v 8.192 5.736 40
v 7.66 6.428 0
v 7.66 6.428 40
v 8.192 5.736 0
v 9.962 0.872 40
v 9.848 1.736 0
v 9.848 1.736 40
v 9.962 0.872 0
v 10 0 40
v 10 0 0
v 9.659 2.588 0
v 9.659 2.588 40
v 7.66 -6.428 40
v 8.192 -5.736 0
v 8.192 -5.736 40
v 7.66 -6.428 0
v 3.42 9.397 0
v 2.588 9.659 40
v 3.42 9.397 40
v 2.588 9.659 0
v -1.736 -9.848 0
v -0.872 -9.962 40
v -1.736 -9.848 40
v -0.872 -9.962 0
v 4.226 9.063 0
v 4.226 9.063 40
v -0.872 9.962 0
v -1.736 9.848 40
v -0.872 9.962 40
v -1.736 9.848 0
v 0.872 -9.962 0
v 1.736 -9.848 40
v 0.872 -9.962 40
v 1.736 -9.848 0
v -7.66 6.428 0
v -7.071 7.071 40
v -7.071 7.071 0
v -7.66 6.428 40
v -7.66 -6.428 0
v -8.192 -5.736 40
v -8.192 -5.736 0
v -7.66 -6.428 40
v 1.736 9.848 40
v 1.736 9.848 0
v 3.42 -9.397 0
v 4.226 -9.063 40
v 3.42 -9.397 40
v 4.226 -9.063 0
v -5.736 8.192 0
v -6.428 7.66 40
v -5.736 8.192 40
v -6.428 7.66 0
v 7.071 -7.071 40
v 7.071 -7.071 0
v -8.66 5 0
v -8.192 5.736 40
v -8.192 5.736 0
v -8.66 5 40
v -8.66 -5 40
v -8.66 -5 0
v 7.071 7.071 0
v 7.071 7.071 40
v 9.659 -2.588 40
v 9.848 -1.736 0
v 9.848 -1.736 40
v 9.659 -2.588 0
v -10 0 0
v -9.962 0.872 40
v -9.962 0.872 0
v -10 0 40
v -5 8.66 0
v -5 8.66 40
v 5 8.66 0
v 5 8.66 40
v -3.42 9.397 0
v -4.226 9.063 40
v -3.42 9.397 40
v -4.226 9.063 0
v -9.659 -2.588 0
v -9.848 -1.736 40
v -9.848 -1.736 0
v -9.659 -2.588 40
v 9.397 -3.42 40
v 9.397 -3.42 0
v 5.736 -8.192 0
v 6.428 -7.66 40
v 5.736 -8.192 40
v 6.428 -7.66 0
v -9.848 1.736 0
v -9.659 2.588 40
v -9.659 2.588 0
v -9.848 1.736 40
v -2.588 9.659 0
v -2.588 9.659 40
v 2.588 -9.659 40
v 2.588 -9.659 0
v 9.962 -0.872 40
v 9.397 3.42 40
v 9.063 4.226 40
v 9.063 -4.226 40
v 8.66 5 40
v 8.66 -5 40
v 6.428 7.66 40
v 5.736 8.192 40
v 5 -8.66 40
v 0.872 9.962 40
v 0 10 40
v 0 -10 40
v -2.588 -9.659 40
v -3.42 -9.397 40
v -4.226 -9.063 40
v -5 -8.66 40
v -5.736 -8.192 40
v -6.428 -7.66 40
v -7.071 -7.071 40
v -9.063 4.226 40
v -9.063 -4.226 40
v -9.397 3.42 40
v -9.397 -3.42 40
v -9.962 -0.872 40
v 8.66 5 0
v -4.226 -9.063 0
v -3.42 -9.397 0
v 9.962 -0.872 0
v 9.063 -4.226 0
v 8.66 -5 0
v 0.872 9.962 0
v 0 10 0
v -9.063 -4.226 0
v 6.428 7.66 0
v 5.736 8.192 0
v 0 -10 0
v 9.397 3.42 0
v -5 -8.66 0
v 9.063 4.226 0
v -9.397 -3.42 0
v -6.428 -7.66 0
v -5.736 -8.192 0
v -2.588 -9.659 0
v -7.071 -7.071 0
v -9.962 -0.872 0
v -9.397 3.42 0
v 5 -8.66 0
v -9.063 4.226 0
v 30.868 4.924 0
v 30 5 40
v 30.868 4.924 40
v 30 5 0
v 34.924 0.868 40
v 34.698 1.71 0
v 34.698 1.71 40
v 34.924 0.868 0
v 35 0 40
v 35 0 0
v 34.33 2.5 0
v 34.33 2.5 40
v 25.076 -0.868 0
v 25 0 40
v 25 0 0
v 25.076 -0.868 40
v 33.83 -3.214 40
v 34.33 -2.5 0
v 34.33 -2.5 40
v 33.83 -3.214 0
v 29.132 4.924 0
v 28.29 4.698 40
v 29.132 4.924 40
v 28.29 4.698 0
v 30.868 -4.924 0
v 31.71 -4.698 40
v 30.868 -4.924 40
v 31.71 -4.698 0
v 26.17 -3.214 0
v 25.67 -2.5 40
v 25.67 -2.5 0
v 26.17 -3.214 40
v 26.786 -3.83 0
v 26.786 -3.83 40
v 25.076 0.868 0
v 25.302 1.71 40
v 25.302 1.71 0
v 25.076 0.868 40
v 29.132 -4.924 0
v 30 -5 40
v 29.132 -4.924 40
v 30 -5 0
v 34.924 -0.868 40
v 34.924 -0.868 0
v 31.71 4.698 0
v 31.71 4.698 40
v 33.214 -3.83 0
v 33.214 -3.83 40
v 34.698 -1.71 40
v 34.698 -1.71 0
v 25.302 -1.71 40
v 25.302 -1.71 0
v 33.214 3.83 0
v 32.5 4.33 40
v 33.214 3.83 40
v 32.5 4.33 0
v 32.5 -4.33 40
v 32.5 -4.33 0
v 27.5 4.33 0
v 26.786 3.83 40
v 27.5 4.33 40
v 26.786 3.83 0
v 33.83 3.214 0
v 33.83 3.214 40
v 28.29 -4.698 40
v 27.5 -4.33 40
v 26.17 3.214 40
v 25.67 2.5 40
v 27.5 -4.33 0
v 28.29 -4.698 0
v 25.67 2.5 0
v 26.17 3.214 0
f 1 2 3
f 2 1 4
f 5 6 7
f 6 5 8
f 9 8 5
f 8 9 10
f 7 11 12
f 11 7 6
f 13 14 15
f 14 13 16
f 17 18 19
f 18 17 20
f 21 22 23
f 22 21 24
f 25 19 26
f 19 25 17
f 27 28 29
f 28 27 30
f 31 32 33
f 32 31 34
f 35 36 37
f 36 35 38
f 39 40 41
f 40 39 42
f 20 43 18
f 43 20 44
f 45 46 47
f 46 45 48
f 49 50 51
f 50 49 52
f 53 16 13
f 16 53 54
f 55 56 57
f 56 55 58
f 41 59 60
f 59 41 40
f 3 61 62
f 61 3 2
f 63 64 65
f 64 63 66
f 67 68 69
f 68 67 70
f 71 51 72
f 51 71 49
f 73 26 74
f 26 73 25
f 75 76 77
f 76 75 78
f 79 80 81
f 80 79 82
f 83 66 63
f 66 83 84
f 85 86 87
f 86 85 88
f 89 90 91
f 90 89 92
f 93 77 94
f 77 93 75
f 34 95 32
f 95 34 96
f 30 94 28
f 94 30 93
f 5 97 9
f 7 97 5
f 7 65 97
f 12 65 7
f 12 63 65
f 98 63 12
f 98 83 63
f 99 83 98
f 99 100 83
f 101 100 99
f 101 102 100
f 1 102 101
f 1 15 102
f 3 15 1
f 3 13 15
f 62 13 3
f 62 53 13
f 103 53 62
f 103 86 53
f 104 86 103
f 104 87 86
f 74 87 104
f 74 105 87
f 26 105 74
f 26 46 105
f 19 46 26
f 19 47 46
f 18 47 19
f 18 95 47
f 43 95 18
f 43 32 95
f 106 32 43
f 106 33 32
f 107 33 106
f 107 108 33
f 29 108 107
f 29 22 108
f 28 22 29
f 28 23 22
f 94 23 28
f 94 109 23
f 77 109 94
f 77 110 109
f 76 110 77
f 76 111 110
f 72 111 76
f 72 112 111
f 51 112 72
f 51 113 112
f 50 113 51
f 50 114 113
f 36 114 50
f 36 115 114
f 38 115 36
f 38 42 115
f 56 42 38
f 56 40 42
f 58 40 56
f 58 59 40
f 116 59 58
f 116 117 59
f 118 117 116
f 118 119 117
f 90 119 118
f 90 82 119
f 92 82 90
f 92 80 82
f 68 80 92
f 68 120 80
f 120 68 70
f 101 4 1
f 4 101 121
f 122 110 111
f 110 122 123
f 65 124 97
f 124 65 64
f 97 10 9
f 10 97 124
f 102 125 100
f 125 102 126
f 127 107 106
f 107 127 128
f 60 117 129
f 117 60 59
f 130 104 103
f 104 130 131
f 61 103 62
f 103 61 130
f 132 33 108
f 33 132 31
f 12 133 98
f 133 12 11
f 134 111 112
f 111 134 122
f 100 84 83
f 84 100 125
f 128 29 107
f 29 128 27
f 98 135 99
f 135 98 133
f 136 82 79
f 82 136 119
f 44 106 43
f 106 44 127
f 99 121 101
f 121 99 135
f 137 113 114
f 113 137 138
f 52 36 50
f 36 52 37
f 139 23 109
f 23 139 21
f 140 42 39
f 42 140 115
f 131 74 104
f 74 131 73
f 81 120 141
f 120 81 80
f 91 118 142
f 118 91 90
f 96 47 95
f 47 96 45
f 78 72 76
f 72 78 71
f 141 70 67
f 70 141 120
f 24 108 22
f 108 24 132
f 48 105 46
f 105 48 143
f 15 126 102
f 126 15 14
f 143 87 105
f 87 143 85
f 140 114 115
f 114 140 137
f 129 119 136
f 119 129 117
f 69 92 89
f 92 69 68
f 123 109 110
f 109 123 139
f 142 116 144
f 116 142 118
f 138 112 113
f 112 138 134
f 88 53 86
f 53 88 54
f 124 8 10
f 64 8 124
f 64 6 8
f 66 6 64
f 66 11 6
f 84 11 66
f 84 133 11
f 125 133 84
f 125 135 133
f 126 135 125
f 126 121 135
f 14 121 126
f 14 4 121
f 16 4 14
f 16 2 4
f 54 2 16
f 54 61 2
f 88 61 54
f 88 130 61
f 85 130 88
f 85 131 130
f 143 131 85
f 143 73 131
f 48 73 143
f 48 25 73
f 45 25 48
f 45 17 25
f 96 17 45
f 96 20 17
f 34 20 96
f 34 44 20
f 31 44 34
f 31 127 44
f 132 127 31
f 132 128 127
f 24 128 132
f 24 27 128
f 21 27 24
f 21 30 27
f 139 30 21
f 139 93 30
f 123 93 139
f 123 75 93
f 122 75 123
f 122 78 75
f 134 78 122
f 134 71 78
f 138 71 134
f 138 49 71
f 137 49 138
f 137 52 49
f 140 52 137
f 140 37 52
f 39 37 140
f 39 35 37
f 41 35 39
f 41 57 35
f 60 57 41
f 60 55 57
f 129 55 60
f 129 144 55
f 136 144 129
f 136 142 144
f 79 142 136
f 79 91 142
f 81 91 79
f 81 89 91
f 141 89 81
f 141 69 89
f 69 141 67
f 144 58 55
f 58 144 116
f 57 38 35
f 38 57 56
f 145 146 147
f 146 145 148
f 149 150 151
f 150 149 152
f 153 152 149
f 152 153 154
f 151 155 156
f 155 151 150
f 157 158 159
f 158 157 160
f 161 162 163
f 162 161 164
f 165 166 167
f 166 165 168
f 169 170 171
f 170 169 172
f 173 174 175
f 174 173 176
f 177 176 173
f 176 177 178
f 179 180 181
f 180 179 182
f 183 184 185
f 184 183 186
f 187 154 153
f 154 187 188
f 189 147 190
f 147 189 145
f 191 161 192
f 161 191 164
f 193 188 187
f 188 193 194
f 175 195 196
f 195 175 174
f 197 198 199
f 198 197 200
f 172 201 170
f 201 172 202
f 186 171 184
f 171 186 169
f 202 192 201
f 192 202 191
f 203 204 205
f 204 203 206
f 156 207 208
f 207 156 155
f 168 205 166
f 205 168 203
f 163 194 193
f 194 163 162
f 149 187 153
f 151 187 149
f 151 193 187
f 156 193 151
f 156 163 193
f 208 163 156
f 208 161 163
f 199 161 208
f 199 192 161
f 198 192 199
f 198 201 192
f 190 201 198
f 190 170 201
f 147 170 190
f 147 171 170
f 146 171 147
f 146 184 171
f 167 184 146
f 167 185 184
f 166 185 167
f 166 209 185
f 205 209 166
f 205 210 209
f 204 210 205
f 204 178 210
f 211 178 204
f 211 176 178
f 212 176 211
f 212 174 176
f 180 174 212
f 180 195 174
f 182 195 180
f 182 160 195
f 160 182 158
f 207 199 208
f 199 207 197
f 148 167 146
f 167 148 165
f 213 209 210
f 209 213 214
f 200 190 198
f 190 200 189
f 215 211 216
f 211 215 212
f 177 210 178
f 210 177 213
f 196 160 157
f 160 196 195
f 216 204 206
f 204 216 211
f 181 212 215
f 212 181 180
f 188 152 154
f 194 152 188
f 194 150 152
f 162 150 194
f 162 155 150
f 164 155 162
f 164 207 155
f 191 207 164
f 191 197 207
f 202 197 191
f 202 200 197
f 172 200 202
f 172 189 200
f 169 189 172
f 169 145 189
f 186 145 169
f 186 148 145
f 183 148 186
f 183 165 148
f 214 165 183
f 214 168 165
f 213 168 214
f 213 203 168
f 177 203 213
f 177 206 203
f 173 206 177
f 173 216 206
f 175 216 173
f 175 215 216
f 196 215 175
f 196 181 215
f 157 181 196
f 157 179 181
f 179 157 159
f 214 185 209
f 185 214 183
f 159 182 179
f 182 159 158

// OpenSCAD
$fn=36;
cylinder(r=10,h=40,$fn=72);
translate([30,0,0])cylinder(r=5,h=40);

//screen capture settings
$vpr=[70,0,25];
$vpd=140;
$vpt=[8,15,16];
